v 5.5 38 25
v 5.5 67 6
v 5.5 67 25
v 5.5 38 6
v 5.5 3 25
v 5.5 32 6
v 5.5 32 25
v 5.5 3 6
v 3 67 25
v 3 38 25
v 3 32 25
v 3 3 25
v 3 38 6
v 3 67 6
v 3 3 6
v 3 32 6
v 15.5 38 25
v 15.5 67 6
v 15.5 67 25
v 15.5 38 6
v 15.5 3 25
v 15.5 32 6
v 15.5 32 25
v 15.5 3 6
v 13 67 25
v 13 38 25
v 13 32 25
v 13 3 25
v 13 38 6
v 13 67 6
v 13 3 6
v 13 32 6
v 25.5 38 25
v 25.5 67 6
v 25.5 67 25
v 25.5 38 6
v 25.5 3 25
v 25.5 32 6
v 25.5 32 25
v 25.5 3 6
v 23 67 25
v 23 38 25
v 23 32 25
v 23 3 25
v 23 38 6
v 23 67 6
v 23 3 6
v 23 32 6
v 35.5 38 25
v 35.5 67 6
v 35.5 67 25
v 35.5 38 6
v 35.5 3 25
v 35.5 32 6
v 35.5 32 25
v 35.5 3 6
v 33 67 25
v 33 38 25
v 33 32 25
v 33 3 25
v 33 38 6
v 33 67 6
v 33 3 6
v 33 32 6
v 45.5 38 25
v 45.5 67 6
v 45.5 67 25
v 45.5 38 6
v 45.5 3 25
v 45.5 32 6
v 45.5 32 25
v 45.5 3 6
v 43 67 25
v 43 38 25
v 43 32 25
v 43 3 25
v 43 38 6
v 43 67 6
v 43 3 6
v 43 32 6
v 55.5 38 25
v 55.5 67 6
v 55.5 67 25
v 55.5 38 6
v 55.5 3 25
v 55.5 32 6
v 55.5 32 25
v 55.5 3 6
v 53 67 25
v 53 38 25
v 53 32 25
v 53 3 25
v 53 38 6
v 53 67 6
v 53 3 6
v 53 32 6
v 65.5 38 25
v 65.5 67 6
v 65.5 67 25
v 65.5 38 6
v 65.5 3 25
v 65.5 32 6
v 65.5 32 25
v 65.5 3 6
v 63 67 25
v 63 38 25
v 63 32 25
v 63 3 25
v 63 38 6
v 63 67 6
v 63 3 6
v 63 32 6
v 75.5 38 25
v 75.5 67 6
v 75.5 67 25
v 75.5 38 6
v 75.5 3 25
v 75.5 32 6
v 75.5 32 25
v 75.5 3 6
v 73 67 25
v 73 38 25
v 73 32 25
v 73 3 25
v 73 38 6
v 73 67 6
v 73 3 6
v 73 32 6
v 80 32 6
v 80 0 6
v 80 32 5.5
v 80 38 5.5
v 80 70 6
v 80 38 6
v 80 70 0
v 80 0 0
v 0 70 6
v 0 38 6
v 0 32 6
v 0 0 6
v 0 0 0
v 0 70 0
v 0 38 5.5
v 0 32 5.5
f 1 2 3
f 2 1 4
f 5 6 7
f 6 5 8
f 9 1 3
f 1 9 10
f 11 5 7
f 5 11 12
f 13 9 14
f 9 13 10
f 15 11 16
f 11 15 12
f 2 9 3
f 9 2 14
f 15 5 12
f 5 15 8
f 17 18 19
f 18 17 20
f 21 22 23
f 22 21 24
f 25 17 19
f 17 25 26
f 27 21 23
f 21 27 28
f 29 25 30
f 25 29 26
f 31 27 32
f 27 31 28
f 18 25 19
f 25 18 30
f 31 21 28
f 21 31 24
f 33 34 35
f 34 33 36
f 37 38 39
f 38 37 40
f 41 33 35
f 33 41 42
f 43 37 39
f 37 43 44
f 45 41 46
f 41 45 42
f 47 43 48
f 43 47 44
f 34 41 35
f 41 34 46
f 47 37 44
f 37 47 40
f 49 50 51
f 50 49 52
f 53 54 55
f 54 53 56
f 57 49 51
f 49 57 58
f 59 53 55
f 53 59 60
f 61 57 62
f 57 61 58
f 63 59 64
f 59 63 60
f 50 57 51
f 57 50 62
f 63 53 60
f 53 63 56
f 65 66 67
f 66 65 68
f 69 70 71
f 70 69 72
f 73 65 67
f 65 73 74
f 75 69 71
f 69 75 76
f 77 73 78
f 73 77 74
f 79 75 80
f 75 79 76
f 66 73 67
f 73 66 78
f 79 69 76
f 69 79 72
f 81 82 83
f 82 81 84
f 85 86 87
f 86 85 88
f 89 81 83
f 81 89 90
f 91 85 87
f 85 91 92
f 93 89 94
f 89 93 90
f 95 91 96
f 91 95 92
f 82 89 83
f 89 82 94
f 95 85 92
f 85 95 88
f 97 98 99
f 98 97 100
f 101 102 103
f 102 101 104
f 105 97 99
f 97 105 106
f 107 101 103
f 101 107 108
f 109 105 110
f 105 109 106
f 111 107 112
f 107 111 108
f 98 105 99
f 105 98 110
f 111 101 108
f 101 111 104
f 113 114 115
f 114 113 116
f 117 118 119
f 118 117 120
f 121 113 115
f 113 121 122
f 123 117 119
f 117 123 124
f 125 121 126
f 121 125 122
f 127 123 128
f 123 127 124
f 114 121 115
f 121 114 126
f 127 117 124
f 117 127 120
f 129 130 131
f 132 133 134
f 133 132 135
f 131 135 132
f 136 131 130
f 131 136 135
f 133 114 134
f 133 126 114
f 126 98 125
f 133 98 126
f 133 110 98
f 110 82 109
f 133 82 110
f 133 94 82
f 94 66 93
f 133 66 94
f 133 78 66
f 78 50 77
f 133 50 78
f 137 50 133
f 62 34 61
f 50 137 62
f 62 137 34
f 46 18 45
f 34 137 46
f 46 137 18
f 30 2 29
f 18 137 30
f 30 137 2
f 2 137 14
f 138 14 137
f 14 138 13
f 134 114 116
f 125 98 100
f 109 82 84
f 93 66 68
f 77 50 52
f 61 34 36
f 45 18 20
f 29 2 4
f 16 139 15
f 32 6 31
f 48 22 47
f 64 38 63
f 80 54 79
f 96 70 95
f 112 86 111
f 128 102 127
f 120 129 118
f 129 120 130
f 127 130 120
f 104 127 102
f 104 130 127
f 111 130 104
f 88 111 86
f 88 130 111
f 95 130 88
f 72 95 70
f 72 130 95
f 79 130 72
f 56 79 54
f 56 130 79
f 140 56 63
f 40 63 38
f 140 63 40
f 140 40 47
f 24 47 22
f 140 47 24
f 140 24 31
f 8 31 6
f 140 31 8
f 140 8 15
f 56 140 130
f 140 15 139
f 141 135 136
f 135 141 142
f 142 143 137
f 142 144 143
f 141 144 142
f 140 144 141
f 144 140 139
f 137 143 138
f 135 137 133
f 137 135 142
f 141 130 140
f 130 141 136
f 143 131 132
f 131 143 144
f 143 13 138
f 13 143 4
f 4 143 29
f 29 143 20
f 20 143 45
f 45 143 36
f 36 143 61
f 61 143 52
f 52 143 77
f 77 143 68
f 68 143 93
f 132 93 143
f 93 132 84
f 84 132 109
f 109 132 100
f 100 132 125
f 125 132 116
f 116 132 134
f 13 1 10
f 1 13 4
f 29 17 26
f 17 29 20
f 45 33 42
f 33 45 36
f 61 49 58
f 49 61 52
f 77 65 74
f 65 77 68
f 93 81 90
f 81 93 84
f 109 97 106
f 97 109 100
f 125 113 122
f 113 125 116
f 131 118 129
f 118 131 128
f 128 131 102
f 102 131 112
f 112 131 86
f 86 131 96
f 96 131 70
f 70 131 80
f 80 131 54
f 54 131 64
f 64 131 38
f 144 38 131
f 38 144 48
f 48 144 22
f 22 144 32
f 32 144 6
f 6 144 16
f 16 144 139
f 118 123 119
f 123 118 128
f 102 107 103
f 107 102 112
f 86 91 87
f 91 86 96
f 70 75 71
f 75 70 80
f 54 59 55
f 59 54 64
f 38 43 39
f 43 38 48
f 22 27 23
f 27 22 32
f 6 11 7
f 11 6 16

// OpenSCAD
$fn = 32;

// ----------------------------------------------------------------------
// Heatsink: slotted fin block
// ----------------------------------------------------------------------

// --- parameters (mm) ---
base_l = 80;              // base length, X
base_w = 70;              // base width, Y
base_t = 6;               // base plate thickness
fin_h = 20;               // fin height above the base
fin_t = 2.5;              // fin thickness
edge = 3;                 // margin from the base ends
pitch = 10;               // fin pitch
slot_w = 6;               // central slot width, Y

n_fins = floor((base_l - 2 * edge - fin_t) / pitch) + 1;  // fin count
total_h = base_t + fin_h - 1;  // overall height

difference() {
union() {
  cube([base_l, base_w, base_t]);
  for (i = [0 : n_fins - 1])
    translate([edge + i * pitch, edge, base_t - 1])
      cube([fin_t, base_w - 2 * edge, fin_h]);
}
  translate([-1, base_w / 2 - slot_w / 2, base_t - 0.5])
    cube([base_l + 2, slot_w, fin_h + 2]);
}
